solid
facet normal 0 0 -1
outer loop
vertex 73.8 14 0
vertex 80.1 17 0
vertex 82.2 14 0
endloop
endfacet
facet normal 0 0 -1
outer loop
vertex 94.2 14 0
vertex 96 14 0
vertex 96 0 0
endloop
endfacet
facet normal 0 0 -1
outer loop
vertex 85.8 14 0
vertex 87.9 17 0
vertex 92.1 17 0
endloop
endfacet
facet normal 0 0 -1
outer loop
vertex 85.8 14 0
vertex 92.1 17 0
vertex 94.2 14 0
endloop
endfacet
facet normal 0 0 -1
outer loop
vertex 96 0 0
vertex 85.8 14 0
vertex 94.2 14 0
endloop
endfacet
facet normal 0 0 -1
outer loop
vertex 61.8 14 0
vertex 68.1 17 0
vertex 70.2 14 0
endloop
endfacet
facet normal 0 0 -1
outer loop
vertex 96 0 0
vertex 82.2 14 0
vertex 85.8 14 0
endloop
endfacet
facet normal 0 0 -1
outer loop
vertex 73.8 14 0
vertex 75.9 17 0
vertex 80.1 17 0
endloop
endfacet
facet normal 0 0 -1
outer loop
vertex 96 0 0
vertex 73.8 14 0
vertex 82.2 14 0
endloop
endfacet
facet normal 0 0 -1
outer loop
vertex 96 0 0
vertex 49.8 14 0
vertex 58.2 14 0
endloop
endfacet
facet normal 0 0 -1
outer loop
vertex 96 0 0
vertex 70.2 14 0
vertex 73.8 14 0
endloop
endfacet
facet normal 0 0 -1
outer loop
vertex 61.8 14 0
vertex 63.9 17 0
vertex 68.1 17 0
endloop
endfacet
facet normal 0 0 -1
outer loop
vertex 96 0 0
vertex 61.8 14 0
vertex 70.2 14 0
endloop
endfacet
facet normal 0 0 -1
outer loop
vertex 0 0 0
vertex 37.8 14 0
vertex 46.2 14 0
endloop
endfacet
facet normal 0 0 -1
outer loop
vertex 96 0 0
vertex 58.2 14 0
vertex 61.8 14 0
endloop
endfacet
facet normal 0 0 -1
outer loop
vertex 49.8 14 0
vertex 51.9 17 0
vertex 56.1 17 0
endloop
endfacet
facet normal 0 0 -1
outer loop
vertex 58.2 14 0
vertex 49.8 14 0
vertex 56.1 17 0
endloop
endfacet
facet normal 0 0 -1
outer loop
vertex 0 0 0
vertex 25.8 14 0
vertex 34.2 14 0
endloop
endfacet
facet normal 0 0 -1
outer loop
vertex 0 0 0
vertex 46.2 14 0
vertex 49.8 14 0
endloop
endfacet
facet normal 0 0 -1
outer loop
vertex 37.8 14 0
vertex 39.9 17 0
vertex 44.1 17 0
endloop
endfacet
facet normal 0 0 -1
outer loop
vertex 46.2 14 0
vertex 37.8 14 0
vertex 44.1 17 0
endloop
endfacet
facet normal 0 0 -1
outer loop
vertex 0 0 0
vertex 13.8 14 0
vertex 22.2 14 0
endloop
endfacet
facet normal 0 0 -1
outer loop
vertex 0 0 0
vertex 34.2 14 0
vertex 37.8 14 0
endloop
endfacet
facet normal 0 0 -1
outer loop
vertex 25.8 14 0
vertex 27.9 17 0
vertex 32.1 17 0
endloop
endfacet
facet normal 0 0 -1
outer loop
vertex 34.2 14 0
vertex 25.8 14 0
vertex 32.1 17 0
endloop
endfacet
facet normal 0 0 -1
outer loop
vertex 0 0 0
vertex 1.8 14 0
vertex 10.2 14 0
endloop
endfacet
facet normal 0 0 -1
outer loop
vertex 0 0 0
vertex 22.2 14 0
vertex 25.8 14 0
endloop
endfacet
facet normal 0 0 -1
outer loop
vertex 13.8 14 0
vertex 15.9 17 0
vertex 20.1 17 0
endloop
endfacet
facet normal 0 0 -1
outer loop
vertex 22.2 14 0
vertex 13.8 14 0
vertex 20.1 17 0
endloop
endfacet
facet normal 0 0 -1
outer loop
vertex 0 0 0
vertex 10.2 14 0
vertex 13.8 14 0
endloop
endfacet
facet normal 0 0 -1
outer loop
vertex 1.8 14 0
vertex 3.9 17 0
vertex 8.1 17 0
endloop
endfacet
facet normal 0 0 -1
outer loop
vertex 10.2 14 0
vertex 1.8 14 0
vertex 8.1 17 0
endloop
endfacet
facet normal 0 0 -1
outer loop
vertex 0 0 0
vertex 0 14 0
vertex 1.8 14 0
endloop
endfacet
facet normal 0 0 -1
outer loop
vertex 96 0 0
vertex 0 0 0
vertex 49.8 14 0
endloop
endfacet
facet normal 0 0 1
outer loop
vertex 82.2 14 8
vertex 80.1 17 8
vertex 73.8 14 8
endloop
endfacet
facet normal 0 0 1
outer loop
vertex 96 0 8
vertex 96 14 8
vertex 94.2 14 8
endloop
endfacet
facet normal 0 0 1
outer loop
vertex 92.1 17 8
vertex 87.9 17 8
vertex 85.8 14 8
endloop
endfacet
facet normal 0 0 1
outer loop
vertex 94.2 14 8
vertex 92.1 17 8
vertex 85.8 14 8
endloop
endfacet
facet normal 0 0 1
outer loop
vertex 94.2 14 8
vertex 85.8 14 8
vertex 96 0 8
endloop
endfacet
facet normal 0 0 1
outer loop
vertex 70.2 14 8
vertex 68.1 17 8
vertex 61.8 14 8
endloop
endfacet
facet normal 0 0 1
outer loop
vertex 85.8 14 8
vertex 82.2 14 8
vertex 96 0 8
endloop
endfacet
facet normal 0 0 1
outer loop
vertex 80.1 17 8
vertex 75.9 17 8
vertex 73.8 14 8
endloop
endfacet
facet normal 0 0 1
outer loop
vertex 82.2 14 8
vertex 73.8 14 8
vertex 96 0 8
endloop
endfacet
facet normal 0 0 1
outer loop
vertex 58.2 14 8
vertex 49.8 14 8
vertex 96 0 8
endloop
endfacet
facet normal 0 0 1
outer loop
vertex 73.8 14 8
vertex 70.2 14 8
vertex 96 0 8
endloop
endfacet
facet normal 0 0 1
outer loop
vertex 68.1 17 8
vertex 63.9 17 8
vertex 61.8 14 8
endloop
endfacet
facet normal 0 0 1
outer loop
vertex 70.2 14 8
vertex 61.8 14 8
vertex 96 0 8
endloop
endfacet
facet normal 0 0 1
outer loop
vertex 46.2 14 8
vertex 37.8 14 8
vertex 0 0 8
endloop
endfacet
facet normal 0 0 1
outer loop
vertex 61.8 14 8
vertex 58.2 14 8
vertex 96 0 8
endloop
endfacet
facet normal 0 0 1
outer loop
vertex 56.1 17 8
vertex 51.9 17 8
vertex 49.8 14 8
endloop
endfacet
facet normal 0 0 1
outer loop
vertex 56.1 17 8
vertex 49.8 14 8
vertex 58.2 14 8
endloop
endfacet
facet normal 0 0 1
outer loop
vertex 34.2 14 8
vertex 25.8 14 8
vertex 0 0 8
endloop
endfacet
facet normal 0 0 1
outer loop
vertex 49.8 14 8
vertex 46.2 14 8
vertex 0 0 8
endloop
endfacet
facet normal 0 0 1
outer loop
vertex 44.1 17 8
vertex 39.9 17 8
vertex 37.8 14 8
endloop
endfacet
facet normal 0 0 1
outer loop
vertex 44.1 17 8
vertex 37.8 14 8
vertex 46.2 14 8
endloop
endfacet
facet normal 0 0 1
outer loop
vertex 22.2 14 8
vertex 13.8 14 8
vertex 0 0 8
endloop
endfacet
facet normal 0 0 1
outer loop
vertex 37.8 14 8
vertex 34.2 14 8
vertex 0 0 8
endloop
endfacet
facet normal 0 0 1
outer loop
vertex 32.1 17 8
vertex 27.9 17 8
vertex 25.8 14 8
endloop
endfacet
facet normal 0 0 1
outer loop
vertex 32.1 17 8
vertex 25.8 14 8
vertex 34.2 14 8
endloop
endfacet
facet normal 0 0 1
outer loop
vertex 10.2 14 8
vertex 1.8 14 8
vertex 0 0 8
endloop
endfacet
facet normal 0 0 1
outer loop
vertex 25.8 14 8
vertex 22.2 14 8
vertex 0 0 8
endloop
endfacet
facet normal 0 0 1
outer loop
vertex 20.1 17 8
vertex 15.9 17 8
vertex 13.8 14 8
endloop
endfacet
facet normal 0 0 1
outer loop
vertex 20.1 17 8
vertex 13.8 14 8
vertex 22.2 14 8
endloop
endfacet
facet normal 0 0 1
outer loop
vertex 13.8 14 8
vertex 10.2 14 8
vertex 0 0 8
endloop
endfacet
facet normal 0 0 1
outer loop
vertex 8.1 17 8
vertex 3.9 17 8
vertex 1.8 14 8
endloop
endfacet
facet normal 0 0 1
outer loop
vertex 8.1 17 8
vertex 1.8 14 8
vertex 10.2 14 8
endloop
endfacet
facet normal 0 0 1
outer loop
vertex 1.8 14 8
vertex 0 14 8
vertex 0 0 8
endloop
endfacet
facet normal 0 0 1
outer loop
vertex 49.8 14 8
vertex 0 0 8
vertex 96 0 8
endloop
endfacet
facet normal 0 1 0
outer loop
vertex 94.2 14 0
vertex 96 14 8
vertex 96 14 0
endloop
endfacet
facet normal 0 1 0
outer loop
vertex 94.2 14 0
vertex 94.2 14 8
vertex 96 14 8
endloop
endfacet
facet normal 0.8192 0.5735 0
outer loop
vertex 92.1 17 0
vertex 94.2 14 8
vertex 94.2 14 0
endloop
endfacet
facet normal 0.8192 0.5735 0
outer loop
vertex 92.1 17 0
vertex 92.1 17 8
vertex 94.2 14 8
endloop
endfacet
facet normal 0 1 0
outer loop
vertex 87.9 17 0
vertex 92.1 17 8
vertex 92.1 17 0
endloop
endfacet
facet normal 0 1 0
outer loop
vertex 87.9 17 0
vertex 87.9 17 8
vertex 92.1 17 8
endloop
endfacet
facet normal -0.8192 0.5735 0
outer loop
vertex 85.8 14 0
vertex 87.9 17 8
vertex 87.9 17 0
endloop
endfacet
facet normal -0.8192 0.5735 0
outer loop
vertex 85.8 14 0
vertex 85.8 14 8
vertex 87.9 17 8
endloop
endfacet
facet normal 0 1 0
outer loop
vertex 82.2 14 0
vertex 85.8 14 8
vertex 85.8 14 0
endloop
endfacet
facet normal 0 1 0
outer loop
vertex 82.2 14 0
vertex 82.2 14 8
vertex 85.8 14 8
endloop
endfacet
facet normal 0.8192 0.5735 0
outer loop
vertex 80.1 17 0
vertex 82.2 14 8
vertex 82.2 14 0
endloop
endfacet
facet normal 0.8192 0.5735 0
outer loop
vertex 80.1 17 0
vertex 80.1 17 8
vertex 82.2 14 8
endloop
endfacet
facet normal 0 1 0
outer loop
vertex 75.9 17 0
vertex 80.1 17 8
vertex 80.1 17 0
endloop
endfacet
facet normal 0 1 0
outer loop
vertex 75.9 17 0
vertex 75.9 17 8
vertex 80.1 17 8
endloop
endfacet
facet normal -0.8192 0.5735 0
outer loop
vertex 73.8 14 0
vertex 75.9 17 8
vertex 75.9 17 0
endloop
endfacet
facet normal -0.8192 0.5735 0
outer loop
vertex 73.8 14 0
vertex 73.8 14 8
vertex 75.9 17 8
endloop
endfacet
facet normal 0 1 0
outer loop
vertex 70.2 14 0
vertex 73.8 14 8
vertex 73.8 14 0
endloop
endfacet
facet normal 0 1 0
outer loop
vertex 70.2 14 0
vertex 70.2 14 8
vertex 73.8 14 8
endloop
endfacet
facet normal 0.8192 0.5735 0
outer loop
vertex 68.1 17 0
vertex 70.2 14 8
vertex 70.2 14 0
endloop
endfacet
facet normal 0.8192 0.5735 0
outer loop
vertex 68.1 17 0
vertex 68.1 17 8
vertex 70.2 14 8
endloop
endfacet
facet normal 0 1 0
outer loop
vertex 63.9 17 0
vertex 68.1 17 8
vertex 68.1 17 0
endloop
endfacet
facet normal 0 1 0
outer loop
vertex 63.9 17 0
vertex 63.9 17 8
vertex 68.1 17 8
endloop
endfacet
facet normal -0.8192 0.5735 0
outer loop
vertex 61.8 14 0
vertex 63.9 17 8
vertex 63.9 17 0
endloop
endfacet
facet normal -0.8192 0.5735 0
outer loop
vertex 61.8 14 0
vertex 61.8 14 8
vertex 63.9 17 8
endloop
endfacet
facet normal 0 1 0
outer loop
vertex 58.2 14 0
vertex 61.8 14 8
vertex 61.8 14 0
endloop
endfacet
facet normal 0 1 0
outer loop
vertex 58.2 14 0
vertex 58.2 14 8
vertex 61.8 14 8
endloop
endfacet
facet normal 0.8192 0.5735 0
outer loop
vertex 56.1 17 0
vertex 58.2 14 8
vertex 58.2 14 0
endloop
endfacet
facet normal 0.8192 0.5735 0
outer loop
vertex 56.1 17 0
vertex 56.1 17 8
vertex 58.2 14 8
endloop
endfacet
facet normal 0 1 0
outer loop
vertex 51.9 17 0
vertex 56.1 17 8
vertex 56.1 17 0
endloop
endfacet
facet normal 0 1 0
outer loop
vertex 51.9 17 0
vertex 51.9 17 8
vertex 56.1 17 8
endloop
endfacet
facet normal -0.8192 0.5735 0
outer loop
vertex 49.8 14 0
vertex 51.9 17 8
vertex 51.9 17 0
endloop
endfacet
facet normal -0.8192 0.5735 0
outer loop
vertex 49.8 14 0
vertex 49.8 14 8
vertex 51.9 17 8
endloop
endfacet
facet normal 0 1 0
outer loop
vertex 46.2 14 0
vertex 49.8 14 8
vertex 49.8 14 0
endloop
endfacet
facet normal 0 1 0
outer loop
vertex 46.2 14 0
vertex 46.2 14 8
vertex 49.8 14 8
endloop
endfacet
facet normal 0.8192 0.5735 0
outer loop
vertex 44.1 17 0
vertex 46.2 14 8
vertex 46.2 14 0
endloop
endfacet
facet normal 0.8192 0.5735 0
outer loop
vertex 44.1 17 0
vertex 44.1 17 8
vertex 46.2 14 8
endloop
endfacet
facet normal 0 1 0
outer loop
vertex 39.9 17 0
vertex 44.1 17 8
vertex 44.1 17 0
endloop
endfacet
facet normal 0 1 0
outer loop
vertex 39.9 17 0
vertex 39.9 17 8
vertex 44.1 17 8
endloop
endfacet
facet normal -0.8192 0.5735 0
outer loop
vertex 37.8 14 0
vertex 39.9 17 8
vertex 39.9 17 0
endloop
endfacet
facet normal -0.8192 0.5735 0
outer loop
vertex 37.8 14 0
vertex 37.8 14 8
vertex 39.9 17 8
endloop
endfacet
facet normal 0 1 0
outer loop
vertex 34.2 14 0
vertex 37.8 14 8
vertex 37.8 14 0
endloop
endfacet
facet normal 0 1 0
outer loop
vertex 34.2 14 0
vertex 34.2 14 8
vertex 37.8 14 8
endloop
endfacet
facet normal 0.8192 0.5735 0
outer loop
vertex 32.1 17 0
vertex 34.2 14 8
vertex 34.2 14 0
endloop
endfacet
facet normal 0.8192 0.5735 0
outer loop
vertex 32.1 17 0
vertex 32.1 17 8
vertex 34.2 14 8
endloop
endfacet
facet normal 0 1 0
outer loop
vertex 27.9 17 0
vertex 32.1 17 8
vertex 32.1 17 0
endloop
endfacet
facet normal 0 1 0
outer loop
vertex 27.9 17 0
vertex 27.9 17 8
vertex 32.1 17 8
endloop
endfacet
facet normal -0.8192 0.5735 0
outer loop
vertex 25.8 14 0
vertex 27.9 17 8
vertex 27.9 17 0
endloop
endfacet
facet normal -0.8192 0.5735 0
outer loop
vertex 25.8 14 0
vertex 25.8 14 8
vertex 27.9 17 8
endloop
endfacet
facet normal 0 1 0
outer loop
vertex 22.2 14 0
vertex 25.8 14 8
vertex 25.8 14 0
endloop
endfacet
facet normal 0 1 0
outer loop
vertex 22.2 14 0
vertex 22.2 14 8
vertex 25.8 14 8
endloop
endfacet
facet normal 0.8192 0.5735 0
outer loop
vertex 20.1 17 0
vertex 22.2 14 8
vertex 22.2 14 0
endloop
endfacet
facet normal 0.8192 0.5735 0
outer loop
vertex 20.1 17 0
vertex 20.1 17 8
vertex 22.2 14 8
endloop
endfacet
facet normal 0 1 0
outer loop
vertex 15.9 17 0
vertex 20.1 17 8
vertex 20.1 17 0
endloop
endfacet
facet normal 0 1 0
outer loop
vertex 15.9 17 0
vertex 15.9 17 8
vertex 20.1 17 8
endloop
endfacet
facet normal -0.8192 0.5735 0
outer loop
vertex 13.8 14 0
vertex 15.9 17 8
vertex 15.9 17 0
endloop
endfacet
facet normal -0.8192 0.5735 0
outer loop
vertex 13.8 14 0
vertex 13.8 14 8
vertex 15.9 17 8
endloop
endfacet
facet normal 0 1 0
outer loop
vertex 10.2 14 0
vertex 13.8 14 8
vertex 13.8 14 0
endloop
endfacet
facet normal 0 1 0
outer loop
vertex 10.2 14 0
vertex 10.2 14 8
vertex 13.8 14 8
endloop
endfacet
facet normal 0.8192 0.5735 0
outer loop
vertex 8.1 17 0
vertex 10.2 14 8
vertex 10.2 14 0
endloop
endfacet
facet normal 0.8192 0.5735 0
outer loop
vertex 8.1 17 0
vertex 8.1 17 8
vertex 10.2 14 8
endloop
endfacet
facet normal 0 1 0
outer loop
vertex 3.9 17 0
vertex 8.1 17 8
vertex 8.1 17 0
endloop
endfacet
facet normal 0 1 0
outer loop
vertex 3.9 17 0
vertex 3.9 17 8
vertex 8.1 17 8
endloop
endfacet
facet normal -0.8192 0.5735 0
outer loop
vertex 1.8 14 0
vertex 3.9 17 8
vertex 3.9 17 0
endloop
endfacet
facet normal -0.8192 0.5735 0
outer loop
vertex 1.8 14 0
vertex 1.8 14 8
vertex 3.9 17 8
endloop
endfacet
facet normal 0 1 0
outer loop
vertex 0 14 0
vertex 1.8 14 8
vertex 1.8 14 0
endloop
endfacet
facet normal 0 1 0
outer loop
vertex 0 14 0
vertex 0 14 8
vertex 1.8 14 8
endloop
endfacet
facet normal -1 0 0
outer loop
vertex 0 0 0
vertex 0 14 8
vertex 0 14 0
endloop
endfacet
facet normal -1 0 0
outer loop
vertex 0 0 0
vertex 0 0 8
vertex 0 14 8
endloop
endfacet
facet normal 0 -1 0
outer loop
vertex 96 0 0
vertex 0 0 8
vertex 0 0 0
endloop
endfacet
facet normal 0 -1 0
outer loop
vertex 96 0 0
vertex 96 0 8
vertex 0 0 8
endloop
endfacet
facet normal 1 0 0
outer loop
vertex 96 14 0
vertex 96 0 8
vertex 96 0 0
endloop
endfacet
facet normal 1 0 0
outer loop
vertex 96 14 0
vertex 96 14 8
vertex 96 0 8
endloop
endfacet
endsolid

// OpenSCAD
$fn = 32;

// ----------------------------------------------------------------------
// Gear rack: 8 teeth, pitch 12 mm
// ----------------------------------------------------------------------

// --- parameters (mm) ---
teeth = 8;                // number of teeth
pitch = 12;               // tooth pitch, X
root_w = 8.4;             // tooth width at the root
tip_w = 4.2;              // tooth width at the tip
base_h = 14;              // rack body height, Y
tooth_h = 3;              // tooth height above the body
plate_t = 8;              // rack width, Z (extrusion height)

rack_l = teeth * pitch;  // overall length
total_h = base_h + tooth_h;  // overall height

profile = [[0, 0], [96, 0], [96, 14], [94.2, 14], [92.1, 17], [87.9, 17], [85.8, 14], [82.2, 14], [80.1, 17], [75.9, 17], [73.8, 14], [70.2, 14], [68.1, 17], [63.9, 17], [61.8, 14], [58.2, 14], [56.1, 17], [51.9, 17], [49.8, 14], [46.2, 14], [44.1, 17], [39.9, 17], [37.8, 14], [34.2, 14], [32.1, 17], [27.9, 17], [25.8, 14], [22.2, 14], [20.1, 17], [15.9, 17], [13.8, 14], [10.2, 14], [8.1, 17], [3.9, 17], [1.8, 14], [0, 14]];  // primary outline, 36 points, counter clockwise

// --- the one profile operation ---
linear_extrude(height = plate_t) polygon(points = profile);
